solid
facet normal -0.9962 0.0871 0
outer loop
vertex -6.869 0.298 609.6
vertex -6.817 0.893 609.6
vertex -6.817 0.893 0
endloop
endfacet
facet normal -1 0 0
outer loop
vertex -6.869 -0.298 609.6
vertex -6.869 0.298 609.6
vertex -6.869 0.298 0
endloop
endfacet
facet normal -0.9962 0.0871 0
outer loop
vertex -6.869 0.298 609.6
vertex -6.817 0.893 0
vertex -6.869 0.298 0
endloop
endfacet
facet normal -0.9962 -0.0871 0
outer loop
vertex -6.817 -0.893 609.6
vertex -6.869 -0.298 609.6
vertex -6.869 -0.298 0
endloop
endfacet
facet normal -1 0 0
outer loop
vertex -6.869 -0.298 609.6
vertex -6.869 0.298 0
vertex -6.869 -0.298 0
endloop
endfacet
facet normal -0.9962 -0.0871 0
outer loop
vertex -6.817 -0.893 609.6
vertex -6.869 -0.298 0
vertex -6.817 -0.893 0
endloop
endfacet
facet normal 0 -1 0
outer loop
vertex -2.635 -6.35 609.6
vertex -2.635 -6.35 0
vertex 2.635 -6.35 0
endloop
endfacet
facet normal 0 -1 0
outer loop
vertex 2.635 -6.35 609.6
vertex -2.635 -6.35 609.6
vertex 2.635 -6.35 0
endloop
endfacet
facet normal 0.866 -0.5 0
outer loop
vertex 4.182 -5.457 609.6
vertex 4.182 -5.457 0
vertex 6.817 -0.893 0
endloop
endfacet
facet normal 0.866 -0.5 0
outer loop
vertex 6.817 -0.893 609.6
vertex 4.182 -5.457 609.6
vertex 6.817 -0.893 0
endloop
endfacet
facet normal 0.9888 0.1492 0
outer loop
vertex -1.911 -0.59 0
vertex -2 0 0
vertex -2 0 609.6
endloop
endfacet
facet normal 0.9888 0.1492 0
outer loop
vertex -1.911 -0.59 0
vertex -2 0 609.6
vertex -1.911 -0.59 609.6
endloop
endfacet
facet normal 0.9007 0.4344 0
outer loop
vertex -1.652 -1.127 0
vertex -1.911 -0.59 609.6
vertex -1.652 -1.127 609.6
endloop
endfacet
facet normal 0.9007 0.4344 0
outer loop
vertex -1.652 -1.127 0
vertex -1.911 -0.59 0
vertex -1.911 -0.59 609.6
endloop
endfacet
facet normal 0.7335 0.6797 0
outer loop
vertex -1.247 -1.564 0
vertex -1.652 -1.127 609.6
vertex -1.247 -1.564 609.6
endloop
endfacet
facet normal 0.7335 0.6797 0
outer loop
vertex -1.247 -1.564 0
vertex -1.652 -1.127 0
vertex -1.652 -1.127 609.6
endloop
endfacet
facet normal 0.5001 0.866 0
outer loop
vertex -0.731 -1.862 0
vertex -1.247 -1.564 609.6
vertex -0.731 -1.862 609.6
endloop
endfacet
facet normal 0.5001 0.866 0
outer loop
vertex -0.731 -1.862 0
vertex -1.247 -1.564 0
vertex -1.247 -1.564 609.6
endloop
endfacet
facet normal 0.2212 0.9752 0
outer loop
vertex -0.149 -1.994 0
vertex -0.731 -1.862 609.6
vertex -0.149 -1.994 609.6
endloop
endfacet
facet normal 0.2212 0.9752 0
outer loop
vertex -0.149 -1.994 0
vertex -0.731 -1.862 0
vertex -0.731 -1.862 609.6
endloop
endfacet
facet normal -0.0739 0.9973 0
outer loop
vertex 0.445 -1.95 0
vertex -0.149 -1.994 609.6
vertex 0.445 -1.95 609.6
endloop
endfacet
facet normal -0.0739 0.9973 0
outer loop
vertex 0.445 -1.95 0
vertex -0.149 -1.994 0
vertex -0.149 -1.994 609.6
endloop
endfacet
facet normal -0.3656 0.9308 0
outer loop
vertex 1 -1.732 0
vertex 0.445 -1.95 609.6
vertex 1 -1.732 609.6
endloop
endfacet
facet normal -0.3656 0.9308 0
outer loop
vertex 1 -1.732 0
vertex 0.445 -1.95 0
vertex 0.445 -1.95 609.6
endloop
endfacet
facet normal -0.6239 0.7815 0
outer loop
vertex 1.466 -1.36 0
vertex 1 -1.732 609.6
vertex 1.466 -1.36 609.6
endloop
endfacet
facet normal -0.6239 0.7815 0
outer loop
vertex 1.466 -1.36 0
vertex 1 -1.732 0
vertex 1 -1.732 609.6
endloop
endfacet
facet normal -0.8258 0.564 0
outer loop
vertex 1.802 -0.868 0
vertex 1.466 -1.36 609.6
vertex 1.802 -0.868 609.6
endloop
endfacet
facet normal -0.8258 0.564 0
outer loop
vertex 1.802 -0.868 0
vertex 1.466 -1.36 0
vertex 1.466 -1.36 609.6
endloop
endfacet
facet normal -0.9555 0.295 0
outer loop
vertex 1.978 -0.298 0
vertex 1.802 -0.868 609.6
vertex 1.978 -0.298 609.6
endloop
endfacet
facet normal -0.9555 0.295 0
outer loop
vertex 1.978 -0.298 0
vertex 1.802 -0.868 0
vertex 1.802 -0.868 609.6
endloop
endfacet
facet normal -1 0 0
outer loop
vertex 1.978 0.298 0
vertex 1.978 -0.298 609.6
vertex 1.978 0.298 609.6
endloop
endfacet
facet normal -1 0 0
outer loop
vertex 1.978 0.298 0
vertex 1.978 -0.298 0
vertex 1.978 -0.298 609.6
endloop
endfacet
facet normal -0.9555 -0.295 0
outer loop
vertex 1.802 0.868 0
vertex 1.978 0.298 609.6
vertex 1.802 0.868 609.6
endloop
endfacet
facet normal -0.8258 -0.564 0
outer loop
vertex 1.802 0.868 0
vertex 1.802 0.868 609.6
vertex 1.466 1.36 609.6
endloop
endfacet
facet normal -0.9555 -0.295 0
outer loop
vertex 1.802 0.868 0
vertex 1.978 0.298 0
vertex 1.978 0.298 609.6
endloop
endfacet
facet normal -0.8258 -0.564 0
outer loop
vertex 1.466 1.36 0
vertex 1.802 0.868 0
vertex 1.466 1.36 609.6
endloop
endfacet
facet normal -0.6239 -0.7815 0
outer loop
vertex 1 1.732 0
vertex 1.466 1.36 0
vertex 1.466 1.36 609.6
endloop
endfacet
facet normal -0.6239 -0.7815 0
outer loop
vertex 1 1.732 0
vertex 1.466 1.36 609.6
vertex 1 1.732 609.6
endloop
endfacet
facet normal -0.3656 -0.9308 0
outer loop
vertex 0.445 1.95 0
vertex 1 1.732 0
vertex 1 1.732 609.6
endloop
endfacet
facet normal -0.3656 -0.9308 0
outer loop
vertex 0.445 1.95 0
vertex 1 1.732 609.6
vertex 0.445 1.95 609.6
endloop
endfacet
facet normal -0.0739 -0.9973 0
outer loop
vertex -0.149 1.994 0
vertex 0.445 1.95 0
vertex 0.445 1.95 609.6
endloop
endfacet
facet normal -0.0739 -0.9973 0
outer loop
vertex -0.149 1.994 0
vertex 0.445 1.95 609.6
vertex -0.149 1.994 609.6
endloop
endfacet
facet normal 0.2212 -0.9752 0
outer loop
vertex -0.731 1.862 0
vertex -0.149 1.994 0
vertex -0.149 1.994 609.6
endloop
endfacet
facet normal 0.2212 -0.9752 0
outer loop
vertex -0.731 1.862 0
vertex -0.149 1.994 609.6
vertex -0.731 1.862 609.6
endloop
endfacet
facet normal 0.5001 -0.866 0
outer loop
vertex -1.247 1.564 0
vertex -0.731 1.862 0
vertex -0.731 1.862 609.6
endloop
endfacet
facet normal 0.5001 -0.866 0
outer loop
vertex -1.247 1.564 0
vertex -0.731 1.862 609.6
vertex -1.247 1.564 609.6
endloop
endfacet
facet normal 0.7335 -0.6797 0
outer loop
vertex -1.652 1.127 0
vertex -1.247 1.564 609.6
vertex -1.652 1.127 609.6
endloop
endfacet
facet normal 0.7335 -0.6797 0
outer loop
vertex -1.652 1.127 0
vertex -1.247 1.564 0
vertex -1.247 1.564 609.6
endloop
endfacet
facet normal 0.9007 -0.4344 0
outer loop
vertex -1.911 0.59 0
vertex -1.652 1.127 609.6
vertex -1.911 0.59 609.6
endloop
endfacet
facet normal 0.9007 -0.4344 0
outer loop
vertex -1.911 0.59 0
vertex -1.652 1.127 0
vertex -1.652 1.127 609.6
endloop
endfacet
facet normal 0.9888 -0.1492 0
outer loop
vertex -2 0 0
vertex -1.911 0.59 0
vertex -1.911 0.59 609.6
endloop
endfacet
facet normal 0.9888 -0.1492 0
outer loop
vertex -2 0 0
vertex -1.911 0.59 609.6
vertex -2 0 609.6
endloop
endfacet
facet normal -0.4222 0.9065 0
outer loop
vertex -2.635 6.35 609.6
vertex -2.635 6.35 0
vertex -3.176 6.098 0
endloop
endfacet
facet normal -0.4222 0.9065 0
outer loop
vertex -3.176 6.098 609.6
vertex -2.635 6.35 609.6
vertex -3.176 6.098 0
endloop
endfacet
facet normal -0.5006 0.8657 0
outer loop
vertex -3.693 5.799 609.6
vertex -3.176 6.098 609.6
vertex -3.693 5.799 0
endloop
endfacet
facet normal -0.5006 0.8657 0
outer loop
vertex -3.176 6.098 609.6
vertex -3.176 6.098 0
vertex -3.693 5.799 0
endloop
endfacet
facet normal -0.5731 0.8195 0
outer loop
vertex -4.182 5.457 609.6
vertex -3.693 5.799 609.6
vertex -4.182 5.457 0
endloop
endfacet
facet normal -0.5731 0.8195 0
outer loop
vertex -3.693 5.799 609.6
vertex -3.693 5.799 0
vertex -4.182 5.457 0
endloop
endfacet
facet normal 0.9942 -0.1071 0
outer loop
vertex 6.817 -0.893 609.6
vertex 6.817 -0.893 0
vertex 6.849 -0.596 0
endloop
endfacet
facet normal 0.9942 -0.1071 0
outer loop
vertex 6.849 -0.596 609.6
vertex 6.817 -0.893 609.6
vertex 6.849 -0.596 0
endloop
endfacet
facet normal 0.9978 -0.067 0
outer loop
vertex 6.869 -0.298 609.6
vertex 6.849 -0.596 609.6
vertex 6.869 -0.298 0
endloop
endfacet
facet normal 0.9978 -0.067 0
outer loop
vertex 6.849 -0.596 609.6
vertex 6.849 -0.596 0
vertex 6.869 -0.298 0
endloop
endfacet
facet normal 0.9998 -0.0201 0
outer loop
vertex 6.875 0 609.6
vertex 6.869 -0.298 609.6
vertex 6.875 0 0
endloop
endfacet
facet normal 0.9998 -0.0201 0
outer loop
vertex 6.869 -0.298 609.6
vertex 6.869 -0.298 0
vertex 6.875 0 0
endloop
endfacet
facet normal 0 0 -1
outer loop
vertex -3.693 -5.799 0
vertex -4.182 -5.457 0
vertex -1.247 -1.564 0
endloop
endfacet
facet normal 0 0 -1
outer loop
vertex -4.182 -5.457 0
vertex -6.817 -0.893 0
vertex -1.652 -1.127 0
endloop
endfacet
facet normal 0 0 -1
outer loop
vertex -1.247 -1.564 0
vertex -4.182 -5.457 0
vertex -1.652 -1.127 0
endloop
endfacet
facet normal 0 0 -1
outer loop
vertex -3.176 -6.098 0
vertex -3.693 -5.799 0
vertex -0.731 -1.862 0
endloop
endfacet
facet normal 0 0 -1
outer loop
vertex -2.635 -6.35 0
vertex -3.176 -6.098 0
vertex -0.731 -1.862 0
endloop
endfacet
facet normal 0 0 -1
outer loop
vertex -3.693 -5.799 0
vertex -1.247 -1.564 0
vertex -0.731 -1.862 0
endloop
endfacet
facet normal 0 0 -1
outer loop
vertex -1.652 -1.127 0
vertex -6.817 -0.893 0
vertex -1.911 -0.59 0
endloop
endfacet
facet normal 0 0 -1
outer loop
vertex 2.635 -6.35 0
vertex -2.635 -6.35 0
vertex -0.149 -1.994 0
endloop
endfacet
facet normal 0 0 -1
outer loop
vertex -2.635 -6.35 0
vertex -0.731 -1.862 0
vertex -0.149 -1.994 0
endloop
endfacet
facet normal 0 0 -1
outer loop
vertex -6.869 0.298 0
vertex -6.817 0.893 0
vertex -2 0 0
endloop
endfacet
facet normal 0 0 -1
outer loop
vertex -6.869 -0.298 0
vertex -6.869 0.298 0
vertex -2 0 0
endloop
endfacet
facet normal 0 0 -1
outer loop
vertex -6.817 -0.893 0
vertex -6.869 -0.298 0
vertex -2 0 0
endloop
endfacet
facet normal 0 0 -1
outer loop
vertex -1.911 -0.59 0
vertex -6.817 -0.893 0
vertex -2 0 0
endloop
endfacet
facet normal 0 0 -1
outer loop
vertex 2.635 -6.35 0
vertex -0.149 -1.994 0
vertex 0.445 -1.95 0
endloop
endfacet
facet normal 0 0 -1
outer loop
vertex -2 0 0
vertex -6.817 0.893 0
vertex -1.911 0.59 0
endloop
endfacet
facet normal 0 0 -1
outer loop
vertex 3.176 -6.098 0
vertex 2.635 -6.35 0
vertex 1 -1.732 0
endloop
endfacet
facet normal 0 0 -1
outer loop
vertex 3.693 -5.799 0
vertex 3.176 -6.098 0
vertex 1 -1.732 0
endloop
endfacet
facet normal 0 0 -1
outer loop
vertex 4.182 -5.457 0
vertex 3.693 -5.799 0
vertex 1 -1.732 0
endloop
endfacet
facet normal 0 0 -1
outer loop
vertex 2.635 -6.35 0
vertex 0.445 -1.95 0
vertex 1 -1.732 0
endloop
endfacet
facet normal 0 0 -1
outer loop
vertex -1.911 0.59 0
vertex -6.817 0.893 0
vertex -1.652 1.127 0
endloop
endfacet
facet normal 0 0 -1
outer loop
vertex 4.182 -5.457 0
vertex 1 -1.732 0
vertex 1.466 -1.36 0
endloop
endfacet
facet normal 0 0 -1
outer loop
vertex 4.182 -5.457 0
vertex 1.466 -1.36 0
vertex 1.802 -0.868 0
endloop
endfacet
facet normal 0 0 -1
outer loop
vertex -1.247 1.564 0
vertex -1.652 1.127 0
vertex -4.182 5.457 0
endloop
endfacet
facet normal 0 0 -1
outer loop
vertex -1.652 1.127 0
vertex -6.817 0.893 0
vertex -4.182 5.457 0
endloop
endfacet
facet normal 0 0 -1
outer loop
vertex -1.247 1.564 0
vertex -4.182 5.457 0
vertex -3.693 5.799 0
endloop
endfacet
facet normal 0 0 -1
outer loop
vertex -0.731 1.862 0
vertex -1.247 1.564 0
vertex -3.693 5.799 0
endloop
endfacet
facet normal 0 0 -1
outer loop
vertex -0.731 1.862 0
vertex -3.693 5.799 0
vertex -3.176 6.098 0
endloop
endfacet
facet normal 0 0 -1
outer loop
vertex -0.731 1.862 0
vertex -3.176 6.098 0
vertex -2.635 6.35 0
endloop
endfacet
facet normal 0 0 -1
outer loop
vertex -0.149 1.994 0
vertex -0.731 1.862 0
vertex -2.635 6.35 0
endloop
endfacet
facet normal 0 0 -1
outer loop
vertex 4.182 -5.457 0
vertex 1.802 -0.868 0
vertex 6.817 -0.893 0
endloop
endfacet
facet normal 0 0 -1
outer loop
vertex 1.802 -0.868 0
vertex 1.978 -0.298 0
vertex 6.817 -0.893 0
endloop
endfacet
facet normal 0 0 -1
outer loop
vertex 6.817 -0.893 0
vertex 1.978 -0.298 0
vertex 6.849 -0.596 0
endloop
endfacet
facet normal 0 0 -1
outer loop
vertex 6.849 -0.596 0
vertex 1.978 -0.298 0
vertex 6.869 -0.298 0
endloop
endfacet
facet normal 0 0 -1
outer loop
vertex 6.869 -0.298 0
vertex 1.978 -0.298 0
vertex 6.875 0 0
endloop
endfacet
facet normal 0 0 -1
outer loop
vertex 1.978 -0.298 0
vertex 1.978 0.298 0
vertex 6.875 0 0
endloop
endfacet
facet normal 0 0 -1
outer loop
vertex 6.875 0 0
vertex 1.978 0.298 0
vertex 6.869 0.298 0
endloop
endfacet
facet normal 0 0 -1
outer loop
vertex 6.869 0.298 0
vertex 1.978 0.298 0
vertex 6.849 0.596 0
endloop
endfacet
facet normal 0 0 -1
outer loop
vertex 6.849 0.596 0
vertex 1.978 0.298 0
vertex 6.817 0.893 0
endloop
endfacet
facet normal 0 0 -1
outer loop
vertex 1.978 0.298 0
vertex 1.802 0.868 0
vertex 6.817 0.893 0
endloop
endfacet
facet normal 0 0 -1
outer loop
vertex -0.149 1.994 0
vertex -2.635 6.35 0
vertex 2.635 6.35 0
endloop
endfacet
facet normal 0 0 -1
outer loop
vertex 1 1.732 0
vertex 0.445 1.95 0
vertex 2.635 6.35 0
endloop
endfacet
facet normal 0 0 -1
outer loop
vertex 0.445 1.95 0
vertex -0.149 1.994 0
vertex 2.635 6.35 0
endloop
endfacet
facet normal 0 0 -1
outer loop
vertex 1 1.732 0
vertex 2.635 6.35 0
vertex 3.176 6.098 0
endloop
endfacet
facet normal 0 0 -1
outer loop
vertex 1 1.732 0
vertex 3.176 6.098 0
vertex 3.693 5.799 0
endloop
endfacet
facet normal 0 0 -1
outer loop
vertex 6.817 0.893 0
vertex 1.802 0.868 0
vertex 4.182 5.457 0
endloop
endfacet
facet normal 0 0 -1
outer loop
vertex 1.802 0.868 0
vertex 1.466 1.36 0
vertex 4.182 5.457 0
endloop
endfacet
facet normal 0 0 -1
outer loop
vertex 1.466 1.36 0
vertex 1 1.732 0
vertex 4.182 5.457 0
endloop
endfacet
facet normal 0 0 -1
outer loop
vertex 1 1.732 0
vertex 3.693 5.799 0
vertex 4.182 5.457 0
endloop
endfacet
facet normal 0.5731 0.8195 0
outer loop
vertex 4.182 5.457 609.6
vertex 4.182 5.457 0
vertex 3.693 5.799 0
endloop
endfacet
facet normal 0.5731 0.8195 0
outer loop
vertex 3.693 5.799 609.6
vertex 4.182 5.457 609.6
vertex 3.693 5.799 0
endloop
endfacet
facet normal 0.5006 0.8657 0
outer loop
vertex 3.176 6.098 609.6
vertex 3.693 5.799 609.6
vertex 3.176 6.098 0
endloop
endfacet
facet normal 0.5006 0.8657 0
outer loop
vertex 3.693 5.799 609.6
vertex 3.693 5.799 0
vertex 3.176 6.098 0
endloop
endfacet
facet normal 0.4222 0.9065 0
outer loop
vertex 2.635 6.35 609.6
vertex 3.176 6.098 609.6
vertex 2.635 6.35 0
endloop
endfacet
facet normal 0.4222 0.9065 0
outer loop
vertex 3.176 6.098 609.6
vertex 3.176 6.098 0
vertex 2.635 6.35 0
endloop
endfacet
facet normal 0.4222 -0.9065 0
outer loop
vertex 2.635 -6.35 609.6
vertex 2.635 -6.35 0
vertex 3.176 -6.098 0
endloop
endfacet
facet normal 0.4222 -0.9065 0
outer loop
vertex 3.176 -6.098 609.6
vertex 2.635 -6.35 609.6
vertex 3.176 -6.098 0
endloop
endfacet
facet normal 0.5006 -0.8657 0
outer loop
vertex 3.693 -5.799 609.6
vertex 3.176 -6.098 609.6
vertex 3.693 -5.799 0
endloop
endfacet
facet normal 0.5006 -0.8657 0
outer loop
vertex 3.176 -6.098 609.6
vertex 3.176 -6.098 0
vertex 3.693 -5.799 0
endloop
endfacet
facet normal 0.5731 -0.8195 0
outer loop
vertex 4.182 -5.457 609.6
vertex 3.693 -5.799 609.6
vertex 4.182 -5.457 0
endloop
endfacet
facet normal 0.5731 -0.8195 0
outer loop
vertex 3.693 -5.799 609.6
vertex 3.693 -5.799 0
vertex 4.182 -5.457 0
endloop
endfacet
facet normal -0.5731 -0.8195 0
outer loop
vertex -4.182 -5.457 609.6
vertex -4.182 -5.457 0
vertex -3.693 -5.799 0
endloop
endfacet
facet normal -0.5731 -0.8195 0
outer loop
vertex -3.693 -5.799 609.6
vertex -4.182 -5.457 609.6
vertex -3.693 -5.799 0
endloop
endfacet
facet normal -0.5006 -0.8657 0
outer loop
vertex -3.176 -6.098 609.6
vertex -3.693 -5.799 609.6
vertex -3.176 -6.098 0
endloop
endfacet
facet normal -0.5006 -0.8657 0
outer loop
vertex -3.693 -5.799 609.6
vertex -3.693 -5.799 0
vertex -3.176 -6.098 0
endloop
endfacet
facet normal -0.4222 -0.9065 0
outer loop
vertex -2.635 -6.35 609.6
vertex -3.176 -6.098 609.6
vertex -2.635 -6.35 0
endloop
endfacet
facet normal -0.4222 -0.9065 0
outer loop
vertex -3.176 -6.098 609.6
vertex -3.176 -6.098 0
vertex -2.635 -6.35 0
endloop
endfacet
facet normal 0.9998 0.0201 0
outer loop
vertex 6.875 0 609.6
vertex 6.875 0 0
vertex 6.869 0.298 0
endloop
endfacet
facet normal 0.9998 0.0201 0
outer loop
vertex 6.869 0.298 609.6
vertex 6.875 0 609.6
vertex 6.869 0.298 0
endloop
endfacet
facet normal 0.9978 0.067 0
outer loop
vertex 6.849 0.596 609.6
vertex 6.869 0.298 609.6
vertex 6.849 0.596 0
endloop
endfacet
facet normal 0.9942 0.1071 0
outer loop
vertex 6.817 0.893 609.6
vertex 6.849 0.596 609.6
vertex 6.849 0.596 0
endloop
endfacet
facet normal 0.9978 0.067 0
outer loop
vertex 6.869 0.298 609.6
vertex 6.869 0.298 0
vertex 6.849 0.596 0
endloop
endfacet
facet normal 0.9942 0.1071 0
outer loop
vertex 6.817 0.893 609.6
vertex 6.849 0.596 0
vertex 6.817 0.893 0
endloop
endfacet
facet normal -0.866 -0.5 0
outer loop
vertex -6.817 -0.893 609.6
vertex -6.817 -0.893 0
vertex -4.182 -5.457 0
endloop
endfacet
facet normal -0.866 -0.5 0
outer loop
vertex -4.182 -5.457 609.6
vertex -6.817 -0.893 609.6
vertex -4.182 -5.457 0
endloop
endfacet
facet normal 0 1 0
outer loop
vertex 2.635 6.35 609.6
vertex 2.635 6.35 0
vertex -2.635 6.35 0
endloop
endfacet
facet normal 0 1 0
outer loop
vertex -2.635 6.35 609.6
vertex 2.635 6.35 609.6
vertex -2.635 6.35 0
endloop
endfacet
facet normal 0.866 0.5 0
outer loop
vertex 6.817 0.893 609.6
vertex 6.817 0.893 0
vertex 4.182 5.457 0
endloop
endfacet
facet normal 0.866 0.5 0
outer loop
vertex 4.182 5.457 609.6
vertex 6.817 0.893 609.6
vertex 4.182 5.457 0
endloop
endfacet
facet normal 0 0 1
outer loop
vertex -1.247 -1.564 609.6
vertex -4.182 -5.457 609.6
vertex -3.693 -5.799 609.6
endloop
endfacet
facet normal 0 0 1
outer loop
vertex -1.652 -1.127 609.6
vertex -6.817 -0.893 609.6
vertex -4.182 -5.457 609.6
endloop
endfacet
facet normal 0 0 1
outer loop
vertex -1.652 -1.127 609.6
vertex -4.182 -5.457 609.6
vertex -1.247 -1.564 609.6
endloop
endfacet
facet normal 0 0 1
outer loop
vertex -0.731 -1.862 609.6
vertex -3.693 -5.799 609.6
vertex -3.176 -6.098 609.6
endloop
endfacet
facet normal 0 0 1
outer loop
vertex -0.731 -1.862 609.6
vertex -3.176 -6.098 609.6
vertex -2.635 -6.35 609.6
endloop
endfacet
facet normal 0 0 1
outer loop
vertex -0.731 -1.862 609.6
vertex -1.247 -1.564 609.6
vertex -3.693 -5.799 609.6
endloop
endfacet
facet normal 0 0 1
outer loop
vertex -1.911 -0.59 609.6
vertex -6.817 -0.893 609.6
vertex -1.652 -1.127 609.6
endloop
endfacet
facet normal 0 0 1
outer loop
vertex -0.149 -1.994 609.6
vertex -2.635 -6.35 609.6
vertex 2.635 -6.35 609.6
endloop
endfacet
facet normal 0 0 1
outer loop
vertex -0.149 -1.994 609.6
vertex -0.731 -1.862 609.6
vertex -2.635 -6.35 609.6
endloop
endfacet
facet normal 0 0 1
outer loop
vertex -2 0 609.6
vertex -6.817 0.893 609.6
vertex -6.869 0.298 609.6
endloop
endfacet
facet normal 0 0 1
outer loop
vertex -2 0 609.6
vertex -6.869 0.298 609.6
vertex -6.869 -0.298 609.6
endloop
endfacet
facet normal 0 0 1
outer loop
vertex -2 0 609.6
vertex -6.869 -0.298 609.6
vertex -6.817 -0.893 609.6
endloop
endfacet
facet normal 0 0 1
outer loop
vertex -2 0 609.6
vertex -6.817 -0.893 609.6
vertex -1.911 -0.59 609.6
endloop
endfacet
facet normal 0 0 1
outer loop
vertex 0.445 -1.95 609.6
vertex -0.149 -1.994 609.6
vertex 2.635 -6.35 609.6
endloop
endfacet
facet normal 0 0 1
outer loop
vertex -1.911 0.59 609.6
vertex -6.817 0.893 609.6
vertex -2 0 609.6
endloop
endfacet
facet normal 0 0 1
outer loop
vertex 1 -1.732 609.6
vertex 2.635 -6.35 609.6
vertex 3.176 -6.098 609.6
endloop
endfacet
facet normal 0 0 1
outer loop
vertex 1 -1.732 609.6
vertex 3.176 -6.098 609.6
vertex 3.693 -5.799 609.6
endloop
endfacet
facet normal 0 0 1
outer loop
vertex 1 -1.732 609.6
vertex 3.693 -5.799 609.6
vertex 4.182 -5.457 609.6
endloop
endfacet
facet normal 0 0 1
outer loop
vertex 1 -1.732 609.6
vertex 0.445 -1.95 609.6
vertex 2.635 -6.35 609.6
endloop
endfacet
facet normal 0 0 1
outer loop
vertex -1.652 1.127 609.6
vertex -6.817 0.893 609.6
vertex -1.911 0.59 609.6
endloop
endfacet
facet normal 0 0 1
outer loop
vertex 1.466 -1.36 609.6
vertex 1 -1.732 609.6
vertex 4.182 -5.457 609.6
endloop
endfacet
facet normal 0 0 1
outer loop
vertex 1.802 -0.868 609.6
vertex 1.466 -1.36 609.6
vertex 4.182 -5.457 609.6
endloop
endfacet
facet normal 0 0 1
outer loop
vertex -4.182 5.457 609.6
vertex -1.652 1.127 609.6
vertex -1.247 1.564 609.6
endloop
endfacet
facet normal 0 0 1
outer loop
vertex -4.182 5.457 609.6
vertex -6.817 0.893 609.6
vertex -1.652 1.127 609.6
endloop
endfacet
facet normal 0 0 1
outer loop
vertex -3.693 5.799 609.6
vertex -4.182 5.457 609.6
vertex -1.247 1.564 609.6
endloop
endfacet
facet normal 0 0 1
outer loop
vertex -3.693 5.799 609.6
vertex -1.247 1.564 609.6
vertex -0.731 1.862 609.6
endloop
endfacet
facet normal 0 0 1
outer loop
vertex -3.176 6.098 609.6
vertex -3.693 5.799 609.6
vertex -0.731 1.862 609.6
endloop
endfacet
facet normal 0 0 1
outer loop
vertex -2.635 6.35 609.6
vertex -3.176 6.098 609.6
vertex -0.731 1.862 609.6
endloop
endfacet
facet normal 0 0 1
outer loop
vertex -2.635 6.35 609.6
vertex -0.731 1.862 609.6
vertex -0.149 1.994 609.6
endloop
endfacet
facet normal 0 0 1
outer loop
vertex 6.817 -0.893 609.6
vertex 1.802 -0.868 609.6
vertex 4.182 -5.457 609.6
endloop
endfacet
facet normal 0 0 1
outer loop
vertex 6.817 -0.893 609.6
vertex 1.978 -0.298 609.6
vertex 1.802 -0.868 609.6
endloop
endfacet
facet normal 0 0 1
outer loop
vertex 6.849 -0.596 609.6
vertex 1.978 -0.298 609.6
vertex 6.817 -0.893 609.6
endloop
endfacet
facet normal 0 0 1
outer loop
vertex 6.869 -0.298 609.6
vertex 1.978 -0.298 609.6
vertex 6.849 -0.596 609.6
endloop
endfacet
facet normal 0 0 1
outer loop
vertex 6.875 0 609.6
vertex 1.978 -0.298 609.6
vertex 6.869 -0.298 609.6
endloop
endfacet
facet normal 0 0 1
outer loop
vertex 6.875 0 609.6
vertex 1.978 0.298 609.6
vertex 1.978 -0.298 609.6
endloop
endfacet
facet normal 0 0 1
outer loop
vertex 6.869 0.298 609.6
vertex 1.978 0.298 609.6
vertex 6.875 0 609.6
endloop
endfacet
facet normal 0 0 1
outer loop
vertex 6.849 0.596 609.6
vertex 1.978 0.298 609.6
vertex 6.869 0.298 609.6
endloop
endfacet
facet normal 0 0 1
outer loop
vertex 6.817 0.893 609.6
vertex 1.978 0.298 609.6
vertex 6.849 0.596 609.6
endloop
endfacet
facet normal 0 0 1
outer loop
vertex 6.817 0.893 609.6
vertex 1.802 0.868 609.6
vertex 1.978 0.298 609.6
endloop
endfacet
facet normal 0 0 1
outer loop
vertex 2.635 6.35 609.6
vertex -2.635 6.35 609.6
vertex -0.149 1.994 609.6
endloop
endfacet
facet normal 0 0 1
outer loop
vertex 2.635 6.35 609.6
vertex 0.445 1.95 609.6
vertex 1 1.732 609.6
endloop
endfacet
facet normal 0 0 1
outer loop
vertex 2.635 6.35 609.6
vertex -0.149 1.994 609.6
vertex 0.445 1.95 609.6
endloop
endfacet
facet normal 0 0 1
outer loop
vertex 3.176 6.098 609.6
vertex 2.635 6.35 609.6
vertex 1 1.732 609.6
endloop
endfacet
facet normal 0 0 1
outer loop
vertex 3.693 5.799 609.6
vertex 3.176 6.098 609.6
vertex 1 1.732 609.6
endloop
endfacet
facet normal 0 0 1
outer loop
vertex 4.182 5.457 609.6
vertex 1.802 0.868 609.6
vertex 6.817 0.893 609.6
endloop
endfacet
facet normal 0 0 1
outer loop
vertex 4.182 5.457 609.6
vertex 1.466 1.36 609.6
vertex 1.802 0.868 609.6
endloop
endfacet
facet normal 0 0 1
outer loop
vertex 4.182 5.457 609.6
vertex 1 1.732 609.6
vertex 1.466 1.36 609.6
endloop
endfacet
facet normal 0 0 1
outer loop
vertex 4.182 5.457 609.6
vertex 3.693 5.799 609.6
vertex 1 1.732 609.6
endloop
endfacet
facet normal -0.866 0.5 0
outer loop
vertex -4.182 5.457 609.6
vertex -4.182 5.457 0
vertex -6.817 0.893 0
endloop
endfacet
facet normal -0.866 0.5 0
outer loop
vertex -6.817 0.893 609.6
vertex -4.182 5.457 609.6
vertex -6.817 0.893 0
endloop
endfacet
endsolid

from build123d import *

# Parameters (mm, degrees)
SKETCH1_R           = 2.000000064
BOSS_EXTRUDE1_DEPTH = 609.6


with BuildPart() as part:
    # Sketch1 → Boss-Extrude1 (new body)
    with BuildSketch(Plane.XY):
        with BuildLine():
            ThreePointArc((4.181770846, 5.456960429), (3.437499983, 5.953924622), (2.634980936, 6.35))
            Line((2.634980936, 6.35), (-2.634980936, 6.35))
            ThreePointArc((-2.634980936, 6.35), (-3.437499983, 5.953924622), (-4.181770846, 5.456960429))
            Line((-4.181770846, 5.456960429), (-6.816751782, 0.893039571))
            ThreePointArc((-6.816751782, 0.893039571), (-6.874999966, 0), (-6.816751782, -0.893039571))
            Line((-6.816751782, -0.893039571), (-4.181770846, -5.456960429))
            ThreePointArc((-4.181770846, -5.456960429), (-3.437499983, -5.953924622), (-2.634980936, -6.35))
            Line((-2.634980936, -6.35), (2.634980936, -6.35))
            ThreePointArc((2.634980936, -6.35), (3.437499983, -5.953924622), (4.181770846, -5.456960429))
            Line((4.181770846, -5.456960429), (6.816751782, -0.893039571))
            ThreePointArc((6.816751782, -0.893039571), (6.860422465, -0.447468582), (6.874999966, 0))
            ThreePointArc((6.874999966, 0), (6.860422465, 0.447468582), (6.816751782, 0.893039571))
            Line((6.816751782, 0.893039571), (4.181770846, 5.456960429))
        make_face()
        with Locations(Location((0, 0, 0), (0, 0, 180))):
            Circle(SKETCH1_R, mode=Mode.SUBTRACT)
    extrude(amount=BOSS_EXTRUDE1_DEPTH)


solid = part.part
